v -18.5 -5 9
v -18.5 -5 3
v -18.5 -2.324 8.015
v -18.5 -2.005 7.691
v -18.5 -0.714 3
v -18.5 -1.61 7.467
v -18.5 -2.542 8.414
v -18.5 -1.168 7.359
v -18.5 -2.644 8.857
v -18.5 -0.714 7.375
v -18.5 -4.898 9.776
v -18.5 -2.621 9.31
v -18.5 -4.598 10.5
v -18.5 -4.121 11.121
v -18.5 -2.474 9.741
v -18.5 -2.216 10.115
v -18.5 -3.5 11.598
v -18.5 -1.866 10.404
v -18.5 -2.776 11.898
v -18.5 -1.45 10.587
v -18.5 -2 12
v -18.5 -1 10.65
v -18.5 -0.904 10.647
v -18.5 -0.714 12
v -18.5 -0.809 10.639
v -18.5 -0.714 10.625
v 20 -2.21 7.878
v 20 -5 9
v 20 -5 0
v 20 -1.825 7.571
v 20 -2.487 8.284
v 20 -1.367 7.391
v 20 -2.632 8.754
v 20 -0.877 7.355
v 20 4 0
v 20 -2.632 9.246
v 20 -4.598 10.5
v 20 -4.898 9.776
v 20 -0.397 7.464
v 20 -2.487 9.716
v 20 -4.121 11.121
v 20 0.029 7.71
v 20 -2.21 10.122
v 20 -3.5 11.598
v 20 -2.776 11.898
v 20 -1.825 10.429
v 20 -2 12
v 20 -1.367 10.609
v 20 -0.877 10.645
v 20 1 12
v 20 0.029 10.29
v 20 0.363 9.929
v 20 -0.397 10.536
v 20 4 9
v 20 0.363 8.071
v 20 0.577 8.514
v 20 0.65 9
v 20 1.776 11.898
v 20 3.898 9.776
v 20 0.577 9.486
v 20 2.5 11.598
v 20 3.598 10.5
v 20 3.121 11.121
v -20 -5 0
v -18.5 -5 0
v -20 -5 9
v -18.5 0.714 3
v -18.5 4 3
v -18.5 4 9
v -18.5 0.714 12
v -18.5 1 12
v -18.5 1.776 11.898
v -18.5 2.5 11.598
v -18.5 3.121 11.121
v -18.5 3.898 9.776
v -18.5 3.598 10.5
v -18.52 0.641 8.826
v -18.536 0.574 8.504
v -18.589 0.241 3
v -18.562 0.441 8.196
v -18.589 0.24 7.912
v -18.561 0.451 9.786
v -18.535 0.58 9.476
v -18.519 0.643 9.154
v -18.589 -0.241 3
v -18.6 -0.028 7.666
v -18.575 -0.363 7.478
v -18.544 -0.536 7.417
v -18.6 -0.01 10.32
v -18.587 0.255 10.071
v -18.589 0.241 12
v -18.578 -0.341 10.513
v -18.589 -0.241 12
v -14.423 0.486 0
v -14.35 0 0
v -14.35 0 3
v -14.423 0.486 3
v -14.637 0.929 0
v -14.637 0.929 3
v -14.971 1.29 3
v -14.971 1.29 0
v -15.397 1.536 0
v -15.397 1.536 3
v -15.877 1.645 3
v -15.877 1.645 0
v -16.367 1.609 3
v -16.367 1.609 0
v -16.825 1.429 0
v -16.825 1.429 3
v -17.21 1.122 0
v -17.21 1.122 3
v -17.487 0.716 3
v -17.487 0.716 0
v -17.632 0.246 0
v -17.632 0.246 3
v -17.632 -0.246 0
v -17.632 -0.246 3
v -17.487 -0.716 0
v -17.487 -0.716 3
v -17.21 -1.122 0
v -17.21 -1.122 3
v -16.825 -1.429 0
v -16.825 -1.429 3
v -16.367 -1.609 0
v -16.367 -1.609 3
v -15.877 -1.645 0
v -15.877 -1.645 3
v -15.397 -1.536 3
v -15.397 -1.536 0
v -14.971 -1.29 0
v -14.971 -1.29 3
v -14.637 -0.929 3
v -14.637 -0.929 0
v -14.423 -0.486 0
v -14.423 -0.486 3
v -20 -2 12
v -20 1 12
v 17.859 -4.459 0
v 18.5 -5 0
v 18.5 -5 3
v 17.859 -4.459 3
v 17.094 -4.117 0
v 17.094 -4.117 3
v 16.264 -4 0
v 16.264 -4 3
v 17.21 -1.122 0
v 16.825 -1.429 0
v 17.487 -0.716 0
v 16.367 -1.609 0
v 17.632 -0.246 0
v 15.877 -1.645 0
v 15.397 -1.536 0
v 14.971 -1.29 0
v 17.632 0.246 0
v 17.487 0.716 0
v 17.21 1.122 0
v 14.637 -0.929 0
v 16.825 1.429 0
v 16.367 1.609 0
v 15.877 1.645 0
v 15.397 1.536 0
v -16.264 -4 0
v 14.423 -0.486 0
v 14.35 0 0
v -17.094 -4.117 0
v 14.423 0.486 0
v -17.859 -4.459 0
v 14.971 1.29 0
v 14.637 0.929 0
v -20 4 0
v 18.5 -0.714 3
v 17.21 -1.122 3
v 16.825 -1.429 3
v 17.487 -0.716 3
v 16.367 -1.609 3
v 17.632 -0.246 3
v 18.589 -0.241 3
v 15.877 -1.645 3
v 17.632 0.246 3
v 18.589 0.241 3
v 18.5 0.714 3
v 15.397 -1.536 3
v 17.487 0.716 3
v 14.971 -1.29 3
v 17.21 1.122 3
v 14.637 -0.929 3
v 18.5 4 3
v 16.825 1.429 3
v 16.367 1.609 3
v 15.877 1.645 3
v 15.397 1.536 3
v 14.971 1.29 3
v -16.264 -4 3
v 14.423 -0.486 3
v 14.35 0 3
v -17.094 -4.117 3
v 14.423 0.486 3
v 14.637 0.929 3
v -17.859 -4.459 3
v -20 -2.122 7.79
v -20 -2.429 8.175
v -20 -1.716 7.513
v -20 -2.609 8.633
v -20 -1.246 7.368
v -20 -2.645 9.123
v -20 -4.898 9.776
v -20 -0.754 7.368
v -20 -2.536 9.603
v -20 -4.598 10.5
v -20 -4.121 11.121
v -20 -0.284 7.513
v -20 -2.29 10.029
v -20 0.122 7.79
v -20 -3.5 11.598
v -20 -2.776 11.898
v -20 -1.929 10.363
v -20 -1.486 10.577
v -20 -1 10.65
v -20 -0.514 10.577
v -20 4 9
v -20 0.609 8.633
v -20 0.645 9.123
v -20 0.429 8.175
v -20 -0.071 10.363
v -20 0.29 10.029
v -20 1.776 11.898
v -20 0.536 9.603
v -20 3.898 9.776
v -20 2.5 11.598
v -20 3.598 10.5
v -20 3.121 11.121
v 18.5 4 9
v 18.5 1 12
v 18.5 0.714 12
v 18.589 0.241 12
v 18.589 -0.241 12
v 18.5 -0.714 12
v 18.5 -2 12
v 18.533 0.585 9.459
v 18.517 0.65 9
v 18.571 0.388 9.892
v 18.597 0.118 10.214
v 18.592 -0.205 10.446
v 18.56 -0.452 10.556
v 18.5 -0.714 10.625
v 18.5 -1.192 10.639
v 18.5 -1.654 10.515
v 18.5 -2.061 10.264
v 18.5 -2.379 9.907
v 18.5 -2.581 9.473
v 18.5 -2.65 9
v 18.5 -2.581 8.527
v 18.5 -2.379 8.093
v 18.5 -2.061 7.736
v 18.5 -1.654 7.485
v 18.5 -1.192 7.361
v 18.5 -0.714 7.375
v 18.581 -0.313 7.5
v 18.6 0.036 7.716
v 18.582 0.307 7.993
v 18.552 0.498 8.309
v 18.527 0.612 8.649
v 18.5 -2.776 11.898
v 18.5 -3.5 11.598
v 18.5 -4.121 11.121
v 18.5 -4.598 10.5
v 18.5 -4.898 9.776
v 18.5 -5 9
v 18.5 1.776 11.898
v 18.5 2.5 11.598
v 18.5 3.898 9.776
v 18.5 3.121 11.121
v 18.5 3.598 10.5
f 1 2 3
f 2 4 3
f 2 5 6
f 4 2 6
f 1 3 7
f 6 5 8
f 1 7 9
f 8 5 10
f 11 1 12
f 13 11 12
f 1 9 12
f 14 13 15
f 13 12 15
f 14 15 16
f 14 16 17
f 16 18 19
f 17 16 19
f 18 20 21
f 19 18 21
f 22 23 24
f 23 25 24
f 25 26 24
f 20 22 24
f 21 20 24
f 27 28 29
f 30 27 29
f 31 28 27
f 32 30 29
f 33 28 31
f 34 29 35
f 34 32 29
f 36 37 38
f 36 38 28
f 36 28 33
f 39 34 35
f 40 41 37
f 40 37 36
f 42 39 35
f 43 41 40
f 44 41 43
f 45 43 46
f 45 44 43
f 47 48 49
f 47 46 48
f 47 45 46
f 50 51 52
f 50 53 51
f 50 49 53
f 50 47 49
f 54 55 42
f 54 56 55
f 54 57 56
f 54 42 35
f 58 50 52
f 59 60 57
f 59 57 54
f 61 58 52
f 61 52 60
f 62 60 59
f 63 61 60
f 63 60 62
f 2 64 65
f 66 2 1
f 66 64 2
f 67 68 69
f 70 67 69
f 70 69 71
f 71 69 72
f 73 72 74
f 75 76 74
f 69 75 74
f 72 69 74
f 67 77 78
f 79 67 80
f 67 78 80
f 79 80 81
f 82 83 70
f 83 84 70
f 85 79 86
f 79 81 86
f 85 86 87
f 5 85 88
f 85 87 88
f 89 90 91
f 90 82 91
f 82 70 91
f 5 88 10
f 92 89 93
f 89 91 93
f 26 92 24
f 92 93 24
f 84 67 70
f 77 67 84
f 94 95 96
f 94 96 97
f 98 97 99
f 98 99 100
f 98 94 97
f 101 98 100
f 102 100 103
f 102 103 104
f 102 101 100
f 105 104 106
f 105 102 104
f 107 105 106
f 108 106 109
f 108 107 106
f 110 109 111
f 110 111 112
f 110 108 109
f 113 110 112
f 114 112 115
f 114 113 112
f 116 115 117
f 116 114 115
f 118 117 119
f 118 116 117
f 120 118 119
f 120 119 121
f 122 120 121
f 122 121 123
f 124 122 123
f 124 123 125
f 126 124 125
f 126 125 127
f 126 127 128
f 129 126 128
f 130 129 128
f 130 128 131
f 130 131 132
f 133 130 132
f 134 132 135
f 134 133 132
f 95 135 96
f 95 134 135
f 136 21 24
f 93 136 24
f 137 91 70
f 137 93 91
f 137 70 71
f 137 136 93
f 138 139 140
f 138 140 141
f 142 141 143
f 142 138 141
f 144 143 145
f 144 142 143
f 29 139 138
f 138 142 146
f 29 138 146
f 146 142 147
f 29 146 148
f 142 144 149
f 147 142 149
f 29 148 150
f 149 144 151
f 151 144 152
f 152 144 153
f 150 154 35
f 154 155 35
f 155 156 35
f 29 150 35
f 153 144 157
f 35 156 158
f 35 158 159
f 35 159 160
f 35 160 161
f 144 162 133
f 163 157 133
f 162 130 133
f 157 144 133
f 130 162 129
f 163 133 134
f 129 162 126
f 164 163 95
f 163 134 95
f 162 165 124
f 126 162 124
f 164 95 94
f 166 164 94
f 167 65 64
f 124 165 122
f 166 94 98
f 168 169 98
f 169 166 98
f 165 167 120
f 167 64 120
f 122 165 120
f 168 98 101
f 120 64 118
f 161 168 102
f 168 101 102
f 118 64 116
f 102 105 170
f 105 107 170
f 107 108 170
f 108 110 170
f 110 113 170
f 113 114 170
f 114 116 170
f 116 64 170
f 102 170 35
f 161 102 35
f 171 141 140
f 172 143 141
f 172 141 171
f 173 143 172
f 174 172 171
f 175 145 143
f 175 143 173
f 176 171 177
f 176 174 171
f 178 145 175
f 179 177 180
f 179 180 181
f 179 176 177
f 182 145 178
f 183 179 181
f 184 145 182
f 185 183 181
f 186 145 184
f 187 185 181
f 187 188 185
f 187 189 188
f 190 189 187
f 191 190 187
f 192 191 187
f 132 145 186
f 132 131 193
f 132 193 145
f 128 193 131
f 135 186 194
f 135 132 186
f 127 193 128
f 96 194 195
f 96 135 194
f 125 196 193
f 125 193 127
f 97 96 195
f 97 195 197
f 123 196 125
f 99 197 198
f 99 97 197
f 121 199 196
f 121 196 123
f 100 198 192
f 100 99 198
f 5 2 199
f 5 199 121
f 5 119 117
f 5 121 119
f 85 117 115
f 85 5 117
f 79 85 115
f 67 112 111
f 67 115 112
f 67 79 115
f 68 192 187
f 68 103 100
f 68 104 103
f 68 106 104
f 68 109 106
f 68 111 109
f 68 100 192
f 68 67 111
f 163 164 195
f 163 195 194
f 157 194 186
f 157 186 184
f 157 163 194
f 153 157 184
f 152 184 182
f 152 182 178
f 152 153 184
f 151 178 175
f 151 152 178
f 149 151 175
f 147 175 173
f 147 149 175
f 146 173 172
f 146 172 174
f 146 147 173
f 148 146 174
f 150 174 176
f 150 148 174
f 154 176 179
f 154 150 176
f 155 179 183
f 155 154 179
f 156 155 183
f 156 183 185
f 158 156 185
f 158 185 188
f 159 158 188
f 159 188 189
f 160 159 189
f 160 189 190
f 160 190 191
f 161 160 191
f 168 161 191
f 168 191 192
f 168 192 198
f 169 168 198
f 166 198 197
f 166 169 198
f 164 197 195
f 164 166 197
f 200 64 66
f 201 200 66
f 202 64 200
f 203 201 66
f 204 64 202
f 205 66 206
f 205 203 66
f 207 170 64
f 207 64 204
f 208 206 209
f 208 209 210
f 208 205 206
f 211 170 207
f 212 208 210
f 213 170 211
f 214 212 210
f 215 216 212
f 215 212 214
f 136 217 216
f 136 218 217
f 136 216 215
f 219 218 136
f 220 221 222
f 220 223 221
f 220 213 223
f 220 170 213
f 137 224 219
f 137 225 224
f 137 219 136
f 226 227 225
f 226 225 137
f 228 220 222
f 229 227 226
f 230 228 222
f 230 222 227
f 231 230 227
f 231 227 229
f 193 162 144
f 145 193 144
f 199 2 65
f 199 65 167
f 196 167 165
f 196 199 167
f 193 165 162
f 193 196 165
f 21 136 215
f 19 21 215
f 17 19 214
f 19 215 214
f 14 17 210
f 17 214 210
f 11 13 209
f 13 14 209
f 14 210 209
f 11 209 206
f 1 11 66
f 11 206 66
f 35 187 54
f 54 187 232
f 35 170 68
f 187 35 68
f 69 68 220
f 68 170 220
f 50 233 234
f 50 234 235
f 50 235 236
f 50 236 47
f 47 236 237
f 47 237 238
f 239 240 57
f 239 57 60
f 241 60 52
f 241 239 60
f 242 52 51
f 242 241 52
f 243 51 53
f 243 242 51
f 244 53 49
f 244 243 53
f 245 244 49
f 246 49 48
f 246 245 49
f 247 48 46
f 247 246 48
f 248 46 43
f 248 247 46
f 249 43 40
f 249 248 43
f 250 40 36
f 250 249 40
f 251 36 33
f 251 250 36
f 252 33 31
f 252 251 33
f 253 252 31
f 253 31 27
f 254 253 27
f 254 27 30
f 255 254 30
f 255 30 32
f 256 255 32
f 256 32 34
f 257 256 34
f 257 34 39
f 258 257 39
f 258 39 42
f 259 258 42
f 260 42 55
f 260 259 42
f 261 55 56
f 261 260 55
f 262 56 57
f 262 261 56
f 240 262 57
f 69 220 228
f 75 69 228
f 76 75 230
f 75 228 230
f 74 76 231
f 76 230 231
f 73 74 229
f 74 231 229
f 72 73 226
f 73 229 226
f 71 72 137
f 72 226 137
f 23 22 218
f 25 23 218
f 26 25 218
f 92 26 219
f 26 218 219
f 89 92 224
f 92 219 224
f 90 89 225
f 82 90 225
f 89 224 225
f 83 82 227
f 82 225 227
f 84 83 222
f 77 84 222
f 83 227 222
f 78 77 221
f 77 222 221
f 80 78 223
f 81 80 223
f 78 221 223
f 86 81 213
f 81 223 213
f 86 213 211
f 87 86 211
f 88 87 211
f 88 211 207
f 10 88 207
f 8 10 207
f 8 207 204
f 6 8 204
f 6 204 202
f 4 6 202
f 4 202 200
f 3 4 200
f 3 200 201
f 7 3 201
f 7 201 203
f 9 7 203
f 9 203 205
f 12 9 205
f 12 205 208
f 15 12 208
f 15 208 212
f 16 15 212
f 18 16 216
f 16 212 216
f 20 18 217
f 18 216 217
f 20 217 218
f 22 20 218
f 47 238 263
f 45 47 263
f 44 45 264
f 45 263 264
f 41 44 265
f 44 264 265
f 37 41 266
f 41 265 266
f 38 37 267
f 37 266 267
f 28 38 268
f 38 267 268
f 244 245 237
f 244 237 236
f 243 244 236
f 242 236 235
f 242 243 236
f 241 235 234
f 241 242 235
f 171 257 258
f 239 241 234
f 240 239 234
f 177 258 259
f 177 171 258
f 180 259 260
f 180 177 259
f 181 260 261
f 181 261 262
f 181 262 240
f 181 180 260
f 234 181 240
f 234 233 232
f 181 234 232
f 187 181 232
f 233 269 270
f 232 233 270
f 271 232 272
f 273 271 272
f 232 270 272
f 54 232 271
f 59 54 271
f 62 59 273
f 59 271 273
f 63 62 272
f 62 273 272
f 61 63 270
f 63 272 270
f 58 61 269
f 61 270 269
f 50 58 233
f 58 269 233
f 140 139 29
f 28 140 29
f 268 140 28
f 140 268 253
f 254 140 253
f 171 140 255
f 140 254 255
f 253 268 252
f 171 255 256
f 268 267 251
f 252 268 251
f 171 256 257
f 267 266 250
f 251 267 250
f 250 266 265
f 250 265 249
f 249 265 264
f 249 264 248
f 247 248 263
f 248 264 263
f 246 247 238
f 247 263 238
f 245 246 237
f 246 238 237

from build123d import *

# Parameters (mm, degrees)
ESBO_O1_W                = 40
ESBO_O1_H                = 8
ESBO_O1_R                = 1.65
RESSALTO_EXTRUS_O1_DEPTH = 3
ESBO_O2_W                = 12
ESBO_O2_H                = 9
ESBO_O2_R                = 1.65
RESSALTO_EXTRUS_O2_DEPTH = 1.5
FILETE2_R                = 3
CORTE_EXTRUS_O1_REACH    = 25.854
ESBO_O3_R                = 2.6
ESPELHAR1_START          = 18.5
ESPELHAR1_OUTLINE_R      = 1.65
ESPELHAR1_DEPTH          = 1.5
ESPELHAR1_START_2        = 16.263932023
ESPELHAR1_2_OUTLINE_W    = 1
ESPELHAR1_2_OUTLINE_H    = 3
ESPELHAR1_2_DEPTH        = 2.236067977
ESPELHAR1_START_3        = -1
ESPELHAR1_3_DEPTH        = 4.84942
ESPELHAR1_START_4        = 3
ESPELHAR1_4_DEPTH        = 10


with BuildPart() as part:
    # Esboço1 → Ressalto-extrusão1 (new body)
    with BuildSketch(Plane.XY):
        Rectangle(ESBO_O1_W, ESBO_O1_H)
        with Locations((-16, 0)):
            Circle(ESBO_O1_R, mode=Mode.SUBTRACT)
        with Locations(Location((16, 0, 0), (0, 0, 180))):
            Circle(ESBO_O1_R, mode=Mode.SUBTRACT)
    extrude(amount=RESSALTO_EXTRUS_O1_DEPTH)

    # Esboço2 → Ressalto-extrusão2 (add)
    with BuildSketch(Plane.ZY.offset(20)):
        with Locations((6, -0.5)):
            Rectangle(ESBO_O2_W, ESBO_O2_H)
        with Locations((9, -1)):
            Circle(ESBO_O2_R, mode=Mode.SUBTRACT)
    extrude(amount=-RESSALTO_EXTRUS_O2_DEPTH)

    # Filete2
    # the kernel refuses this fillet: 3 mm, written as the material it adds along each edge
    with BuildSketch(Plane(origin=(-18.5, -4, 3), x_dir=(1, 0, 0), z_dir=(0, 0, -1))) as filete2_piece_1:
        with BuildLine():
            CenterArc((2.236067977, 3), FILETE2_R, 221.810314896, 48.189685104)
            Line((0, 1), (0, 0))
            Line((0, 0), (2.236067977, 0))
        make_face()
    extrude(amount=3)
    # the kernel refuses this fillet: 3 mm, written as the material it takes off along each edge
    with BuildSketch(Plane(origin=(-27.5, -5, 12), x_dir=(0, 0, -1), z_dir=(1, 0, 0))) as filete2_2_piece_1:
        with BuildLine():
            CenterArc((FILETE2_R, FILETE2_R), FILETE2_R, 180, 90)
            Line((0, FILETE2_R), (0, 0))
            Line((0, 0), (FILETE2_R, 0))
        make_face()
    extrude(amount=16.5, mode=Mode.SUBTRACT)
    with BuildSketch(Plane(origin=(-27.5, 4, 12), x_dir=(0, 0, -1), z_dir=(1, 0, 0))) as filete2_2_piece_2:
        with BuildLine():
            CenterArc((FILETE2_R, -FILETE2_R), FILETE2_R, 90, 90)
            Line((0, -FILETE2_R), (0, 0))
            Line((0, 0), (FILETE2_R, 0))
        make_face()
    extrude(amount=16.5, mode=Mode.SUBTRACT)

    # Corte-extrusão1: up to this face of the body (flat: up to its plane)
    corte_extrus_o1_end = Plane(part.part.faces().sort_by_distance((0.749892581, -0.010110038, 3))[0])
    # Esboço3 → Corte-extrusão1 (cut, up to the picked face)
    with BuildSketch(Plane.XY.offset(12), mode=Mode.PRIVATE) as corte_extrus_o1_sk1:
        with Locations((-16, 0)):
            Circle(ESBO_O3_R)
    corte_extrus_o1_tool1 = split(extrude(corte_extrus_o1_sk1.sketch, amount=-CORTE_EXTRUS_O1_REACH, mode=Mode.PRIVATE), bisect_by=corte_extrus_o1_end, keep=Keep.BOTH, mode=Mode.PRIVATE)
    add(corte_extrus_o1_tool1.solids().sort_by(Axis((-16, 0, 12), (0, 0, -1)))[0], mode=Mode.SUBTRACT)

    # Espelhar1: read off the stored shape, not the designer's step
    # Espelhar1 outline → Espelhar1 (add)
    with BuildSketch(Plane.YZ.offset(ESPELHAR1_START)):
        with BuildLine():
            Line((1, 12), (-2, 12))
            ThreePointArc((-2, 12), (-4.121320344, 11.121320344), (-5, 9))
            Line((-5, 9), (-5, 0))
            Line((-5, 0), (-4, 0))
            Line((-4, 0), (-4, 3))
            Line((-4, 3), (4, 3))
            Line((4, 3), (4, 9))
            ThreePointArc((4, 9), (3.121320344, 11.121320344), (1, 12))
        make_face()
        with Locations((-1, 9)):
            Circle(ESPELHAR1_OUTLINE_R, mode=Mode.SUBTRACT)
    extrude(amount=ESPELHAR1_DEPTH)

    # Espelhar1 2 outline → Espelhar1 2 (add)
    with BuildSketch(Plane.YZ.offset(ESPELHAR1_START_2)):
        with Locations((-4.5, 1.5)):
            Rectangle(ESPELHAR1_2_OUTLINE_W, ESPELHAR1_2_OUTLINE_H)
    extrude(amount=ESPELHAR1_2_DEPTH)

    # Espelhar1 3 outline → Espelhar1 3 (cut)
    with BuildSketch(Plane.XY.offset(ESPELHAR1_START_3)):
        with BuildLine():
            Line((16.263932023, -5), (18.5, -5))
            ThreePointArc((18.5, -5), (17.488676894, -4.261387212), (16.263932023, -4))
            Line((16.263932023, -4), (16.263932023, -5))
        make_face()
    extrude(amount=ESPELHAR1_3_DEPTH, mode=Mode.SUBTRACT)

    # Espelhar1 4 outline → Espelhar1 4 (cut)
    with BuildSketch(Plane.XY.offset(ESPELHAR1_START_4)):
        with BuildLine():
            Line((18.5, 0.714142843), (18.5, -0.714142843))
            ThreePointArc((18.5, -0.714142843), (18.6, 0), (18.5, 0.714142843))
        make_face()
    extrude(amount=ESPELHAR1_4_DEPTH, mode=Mode.SUBTRACT)


solid = part.part
